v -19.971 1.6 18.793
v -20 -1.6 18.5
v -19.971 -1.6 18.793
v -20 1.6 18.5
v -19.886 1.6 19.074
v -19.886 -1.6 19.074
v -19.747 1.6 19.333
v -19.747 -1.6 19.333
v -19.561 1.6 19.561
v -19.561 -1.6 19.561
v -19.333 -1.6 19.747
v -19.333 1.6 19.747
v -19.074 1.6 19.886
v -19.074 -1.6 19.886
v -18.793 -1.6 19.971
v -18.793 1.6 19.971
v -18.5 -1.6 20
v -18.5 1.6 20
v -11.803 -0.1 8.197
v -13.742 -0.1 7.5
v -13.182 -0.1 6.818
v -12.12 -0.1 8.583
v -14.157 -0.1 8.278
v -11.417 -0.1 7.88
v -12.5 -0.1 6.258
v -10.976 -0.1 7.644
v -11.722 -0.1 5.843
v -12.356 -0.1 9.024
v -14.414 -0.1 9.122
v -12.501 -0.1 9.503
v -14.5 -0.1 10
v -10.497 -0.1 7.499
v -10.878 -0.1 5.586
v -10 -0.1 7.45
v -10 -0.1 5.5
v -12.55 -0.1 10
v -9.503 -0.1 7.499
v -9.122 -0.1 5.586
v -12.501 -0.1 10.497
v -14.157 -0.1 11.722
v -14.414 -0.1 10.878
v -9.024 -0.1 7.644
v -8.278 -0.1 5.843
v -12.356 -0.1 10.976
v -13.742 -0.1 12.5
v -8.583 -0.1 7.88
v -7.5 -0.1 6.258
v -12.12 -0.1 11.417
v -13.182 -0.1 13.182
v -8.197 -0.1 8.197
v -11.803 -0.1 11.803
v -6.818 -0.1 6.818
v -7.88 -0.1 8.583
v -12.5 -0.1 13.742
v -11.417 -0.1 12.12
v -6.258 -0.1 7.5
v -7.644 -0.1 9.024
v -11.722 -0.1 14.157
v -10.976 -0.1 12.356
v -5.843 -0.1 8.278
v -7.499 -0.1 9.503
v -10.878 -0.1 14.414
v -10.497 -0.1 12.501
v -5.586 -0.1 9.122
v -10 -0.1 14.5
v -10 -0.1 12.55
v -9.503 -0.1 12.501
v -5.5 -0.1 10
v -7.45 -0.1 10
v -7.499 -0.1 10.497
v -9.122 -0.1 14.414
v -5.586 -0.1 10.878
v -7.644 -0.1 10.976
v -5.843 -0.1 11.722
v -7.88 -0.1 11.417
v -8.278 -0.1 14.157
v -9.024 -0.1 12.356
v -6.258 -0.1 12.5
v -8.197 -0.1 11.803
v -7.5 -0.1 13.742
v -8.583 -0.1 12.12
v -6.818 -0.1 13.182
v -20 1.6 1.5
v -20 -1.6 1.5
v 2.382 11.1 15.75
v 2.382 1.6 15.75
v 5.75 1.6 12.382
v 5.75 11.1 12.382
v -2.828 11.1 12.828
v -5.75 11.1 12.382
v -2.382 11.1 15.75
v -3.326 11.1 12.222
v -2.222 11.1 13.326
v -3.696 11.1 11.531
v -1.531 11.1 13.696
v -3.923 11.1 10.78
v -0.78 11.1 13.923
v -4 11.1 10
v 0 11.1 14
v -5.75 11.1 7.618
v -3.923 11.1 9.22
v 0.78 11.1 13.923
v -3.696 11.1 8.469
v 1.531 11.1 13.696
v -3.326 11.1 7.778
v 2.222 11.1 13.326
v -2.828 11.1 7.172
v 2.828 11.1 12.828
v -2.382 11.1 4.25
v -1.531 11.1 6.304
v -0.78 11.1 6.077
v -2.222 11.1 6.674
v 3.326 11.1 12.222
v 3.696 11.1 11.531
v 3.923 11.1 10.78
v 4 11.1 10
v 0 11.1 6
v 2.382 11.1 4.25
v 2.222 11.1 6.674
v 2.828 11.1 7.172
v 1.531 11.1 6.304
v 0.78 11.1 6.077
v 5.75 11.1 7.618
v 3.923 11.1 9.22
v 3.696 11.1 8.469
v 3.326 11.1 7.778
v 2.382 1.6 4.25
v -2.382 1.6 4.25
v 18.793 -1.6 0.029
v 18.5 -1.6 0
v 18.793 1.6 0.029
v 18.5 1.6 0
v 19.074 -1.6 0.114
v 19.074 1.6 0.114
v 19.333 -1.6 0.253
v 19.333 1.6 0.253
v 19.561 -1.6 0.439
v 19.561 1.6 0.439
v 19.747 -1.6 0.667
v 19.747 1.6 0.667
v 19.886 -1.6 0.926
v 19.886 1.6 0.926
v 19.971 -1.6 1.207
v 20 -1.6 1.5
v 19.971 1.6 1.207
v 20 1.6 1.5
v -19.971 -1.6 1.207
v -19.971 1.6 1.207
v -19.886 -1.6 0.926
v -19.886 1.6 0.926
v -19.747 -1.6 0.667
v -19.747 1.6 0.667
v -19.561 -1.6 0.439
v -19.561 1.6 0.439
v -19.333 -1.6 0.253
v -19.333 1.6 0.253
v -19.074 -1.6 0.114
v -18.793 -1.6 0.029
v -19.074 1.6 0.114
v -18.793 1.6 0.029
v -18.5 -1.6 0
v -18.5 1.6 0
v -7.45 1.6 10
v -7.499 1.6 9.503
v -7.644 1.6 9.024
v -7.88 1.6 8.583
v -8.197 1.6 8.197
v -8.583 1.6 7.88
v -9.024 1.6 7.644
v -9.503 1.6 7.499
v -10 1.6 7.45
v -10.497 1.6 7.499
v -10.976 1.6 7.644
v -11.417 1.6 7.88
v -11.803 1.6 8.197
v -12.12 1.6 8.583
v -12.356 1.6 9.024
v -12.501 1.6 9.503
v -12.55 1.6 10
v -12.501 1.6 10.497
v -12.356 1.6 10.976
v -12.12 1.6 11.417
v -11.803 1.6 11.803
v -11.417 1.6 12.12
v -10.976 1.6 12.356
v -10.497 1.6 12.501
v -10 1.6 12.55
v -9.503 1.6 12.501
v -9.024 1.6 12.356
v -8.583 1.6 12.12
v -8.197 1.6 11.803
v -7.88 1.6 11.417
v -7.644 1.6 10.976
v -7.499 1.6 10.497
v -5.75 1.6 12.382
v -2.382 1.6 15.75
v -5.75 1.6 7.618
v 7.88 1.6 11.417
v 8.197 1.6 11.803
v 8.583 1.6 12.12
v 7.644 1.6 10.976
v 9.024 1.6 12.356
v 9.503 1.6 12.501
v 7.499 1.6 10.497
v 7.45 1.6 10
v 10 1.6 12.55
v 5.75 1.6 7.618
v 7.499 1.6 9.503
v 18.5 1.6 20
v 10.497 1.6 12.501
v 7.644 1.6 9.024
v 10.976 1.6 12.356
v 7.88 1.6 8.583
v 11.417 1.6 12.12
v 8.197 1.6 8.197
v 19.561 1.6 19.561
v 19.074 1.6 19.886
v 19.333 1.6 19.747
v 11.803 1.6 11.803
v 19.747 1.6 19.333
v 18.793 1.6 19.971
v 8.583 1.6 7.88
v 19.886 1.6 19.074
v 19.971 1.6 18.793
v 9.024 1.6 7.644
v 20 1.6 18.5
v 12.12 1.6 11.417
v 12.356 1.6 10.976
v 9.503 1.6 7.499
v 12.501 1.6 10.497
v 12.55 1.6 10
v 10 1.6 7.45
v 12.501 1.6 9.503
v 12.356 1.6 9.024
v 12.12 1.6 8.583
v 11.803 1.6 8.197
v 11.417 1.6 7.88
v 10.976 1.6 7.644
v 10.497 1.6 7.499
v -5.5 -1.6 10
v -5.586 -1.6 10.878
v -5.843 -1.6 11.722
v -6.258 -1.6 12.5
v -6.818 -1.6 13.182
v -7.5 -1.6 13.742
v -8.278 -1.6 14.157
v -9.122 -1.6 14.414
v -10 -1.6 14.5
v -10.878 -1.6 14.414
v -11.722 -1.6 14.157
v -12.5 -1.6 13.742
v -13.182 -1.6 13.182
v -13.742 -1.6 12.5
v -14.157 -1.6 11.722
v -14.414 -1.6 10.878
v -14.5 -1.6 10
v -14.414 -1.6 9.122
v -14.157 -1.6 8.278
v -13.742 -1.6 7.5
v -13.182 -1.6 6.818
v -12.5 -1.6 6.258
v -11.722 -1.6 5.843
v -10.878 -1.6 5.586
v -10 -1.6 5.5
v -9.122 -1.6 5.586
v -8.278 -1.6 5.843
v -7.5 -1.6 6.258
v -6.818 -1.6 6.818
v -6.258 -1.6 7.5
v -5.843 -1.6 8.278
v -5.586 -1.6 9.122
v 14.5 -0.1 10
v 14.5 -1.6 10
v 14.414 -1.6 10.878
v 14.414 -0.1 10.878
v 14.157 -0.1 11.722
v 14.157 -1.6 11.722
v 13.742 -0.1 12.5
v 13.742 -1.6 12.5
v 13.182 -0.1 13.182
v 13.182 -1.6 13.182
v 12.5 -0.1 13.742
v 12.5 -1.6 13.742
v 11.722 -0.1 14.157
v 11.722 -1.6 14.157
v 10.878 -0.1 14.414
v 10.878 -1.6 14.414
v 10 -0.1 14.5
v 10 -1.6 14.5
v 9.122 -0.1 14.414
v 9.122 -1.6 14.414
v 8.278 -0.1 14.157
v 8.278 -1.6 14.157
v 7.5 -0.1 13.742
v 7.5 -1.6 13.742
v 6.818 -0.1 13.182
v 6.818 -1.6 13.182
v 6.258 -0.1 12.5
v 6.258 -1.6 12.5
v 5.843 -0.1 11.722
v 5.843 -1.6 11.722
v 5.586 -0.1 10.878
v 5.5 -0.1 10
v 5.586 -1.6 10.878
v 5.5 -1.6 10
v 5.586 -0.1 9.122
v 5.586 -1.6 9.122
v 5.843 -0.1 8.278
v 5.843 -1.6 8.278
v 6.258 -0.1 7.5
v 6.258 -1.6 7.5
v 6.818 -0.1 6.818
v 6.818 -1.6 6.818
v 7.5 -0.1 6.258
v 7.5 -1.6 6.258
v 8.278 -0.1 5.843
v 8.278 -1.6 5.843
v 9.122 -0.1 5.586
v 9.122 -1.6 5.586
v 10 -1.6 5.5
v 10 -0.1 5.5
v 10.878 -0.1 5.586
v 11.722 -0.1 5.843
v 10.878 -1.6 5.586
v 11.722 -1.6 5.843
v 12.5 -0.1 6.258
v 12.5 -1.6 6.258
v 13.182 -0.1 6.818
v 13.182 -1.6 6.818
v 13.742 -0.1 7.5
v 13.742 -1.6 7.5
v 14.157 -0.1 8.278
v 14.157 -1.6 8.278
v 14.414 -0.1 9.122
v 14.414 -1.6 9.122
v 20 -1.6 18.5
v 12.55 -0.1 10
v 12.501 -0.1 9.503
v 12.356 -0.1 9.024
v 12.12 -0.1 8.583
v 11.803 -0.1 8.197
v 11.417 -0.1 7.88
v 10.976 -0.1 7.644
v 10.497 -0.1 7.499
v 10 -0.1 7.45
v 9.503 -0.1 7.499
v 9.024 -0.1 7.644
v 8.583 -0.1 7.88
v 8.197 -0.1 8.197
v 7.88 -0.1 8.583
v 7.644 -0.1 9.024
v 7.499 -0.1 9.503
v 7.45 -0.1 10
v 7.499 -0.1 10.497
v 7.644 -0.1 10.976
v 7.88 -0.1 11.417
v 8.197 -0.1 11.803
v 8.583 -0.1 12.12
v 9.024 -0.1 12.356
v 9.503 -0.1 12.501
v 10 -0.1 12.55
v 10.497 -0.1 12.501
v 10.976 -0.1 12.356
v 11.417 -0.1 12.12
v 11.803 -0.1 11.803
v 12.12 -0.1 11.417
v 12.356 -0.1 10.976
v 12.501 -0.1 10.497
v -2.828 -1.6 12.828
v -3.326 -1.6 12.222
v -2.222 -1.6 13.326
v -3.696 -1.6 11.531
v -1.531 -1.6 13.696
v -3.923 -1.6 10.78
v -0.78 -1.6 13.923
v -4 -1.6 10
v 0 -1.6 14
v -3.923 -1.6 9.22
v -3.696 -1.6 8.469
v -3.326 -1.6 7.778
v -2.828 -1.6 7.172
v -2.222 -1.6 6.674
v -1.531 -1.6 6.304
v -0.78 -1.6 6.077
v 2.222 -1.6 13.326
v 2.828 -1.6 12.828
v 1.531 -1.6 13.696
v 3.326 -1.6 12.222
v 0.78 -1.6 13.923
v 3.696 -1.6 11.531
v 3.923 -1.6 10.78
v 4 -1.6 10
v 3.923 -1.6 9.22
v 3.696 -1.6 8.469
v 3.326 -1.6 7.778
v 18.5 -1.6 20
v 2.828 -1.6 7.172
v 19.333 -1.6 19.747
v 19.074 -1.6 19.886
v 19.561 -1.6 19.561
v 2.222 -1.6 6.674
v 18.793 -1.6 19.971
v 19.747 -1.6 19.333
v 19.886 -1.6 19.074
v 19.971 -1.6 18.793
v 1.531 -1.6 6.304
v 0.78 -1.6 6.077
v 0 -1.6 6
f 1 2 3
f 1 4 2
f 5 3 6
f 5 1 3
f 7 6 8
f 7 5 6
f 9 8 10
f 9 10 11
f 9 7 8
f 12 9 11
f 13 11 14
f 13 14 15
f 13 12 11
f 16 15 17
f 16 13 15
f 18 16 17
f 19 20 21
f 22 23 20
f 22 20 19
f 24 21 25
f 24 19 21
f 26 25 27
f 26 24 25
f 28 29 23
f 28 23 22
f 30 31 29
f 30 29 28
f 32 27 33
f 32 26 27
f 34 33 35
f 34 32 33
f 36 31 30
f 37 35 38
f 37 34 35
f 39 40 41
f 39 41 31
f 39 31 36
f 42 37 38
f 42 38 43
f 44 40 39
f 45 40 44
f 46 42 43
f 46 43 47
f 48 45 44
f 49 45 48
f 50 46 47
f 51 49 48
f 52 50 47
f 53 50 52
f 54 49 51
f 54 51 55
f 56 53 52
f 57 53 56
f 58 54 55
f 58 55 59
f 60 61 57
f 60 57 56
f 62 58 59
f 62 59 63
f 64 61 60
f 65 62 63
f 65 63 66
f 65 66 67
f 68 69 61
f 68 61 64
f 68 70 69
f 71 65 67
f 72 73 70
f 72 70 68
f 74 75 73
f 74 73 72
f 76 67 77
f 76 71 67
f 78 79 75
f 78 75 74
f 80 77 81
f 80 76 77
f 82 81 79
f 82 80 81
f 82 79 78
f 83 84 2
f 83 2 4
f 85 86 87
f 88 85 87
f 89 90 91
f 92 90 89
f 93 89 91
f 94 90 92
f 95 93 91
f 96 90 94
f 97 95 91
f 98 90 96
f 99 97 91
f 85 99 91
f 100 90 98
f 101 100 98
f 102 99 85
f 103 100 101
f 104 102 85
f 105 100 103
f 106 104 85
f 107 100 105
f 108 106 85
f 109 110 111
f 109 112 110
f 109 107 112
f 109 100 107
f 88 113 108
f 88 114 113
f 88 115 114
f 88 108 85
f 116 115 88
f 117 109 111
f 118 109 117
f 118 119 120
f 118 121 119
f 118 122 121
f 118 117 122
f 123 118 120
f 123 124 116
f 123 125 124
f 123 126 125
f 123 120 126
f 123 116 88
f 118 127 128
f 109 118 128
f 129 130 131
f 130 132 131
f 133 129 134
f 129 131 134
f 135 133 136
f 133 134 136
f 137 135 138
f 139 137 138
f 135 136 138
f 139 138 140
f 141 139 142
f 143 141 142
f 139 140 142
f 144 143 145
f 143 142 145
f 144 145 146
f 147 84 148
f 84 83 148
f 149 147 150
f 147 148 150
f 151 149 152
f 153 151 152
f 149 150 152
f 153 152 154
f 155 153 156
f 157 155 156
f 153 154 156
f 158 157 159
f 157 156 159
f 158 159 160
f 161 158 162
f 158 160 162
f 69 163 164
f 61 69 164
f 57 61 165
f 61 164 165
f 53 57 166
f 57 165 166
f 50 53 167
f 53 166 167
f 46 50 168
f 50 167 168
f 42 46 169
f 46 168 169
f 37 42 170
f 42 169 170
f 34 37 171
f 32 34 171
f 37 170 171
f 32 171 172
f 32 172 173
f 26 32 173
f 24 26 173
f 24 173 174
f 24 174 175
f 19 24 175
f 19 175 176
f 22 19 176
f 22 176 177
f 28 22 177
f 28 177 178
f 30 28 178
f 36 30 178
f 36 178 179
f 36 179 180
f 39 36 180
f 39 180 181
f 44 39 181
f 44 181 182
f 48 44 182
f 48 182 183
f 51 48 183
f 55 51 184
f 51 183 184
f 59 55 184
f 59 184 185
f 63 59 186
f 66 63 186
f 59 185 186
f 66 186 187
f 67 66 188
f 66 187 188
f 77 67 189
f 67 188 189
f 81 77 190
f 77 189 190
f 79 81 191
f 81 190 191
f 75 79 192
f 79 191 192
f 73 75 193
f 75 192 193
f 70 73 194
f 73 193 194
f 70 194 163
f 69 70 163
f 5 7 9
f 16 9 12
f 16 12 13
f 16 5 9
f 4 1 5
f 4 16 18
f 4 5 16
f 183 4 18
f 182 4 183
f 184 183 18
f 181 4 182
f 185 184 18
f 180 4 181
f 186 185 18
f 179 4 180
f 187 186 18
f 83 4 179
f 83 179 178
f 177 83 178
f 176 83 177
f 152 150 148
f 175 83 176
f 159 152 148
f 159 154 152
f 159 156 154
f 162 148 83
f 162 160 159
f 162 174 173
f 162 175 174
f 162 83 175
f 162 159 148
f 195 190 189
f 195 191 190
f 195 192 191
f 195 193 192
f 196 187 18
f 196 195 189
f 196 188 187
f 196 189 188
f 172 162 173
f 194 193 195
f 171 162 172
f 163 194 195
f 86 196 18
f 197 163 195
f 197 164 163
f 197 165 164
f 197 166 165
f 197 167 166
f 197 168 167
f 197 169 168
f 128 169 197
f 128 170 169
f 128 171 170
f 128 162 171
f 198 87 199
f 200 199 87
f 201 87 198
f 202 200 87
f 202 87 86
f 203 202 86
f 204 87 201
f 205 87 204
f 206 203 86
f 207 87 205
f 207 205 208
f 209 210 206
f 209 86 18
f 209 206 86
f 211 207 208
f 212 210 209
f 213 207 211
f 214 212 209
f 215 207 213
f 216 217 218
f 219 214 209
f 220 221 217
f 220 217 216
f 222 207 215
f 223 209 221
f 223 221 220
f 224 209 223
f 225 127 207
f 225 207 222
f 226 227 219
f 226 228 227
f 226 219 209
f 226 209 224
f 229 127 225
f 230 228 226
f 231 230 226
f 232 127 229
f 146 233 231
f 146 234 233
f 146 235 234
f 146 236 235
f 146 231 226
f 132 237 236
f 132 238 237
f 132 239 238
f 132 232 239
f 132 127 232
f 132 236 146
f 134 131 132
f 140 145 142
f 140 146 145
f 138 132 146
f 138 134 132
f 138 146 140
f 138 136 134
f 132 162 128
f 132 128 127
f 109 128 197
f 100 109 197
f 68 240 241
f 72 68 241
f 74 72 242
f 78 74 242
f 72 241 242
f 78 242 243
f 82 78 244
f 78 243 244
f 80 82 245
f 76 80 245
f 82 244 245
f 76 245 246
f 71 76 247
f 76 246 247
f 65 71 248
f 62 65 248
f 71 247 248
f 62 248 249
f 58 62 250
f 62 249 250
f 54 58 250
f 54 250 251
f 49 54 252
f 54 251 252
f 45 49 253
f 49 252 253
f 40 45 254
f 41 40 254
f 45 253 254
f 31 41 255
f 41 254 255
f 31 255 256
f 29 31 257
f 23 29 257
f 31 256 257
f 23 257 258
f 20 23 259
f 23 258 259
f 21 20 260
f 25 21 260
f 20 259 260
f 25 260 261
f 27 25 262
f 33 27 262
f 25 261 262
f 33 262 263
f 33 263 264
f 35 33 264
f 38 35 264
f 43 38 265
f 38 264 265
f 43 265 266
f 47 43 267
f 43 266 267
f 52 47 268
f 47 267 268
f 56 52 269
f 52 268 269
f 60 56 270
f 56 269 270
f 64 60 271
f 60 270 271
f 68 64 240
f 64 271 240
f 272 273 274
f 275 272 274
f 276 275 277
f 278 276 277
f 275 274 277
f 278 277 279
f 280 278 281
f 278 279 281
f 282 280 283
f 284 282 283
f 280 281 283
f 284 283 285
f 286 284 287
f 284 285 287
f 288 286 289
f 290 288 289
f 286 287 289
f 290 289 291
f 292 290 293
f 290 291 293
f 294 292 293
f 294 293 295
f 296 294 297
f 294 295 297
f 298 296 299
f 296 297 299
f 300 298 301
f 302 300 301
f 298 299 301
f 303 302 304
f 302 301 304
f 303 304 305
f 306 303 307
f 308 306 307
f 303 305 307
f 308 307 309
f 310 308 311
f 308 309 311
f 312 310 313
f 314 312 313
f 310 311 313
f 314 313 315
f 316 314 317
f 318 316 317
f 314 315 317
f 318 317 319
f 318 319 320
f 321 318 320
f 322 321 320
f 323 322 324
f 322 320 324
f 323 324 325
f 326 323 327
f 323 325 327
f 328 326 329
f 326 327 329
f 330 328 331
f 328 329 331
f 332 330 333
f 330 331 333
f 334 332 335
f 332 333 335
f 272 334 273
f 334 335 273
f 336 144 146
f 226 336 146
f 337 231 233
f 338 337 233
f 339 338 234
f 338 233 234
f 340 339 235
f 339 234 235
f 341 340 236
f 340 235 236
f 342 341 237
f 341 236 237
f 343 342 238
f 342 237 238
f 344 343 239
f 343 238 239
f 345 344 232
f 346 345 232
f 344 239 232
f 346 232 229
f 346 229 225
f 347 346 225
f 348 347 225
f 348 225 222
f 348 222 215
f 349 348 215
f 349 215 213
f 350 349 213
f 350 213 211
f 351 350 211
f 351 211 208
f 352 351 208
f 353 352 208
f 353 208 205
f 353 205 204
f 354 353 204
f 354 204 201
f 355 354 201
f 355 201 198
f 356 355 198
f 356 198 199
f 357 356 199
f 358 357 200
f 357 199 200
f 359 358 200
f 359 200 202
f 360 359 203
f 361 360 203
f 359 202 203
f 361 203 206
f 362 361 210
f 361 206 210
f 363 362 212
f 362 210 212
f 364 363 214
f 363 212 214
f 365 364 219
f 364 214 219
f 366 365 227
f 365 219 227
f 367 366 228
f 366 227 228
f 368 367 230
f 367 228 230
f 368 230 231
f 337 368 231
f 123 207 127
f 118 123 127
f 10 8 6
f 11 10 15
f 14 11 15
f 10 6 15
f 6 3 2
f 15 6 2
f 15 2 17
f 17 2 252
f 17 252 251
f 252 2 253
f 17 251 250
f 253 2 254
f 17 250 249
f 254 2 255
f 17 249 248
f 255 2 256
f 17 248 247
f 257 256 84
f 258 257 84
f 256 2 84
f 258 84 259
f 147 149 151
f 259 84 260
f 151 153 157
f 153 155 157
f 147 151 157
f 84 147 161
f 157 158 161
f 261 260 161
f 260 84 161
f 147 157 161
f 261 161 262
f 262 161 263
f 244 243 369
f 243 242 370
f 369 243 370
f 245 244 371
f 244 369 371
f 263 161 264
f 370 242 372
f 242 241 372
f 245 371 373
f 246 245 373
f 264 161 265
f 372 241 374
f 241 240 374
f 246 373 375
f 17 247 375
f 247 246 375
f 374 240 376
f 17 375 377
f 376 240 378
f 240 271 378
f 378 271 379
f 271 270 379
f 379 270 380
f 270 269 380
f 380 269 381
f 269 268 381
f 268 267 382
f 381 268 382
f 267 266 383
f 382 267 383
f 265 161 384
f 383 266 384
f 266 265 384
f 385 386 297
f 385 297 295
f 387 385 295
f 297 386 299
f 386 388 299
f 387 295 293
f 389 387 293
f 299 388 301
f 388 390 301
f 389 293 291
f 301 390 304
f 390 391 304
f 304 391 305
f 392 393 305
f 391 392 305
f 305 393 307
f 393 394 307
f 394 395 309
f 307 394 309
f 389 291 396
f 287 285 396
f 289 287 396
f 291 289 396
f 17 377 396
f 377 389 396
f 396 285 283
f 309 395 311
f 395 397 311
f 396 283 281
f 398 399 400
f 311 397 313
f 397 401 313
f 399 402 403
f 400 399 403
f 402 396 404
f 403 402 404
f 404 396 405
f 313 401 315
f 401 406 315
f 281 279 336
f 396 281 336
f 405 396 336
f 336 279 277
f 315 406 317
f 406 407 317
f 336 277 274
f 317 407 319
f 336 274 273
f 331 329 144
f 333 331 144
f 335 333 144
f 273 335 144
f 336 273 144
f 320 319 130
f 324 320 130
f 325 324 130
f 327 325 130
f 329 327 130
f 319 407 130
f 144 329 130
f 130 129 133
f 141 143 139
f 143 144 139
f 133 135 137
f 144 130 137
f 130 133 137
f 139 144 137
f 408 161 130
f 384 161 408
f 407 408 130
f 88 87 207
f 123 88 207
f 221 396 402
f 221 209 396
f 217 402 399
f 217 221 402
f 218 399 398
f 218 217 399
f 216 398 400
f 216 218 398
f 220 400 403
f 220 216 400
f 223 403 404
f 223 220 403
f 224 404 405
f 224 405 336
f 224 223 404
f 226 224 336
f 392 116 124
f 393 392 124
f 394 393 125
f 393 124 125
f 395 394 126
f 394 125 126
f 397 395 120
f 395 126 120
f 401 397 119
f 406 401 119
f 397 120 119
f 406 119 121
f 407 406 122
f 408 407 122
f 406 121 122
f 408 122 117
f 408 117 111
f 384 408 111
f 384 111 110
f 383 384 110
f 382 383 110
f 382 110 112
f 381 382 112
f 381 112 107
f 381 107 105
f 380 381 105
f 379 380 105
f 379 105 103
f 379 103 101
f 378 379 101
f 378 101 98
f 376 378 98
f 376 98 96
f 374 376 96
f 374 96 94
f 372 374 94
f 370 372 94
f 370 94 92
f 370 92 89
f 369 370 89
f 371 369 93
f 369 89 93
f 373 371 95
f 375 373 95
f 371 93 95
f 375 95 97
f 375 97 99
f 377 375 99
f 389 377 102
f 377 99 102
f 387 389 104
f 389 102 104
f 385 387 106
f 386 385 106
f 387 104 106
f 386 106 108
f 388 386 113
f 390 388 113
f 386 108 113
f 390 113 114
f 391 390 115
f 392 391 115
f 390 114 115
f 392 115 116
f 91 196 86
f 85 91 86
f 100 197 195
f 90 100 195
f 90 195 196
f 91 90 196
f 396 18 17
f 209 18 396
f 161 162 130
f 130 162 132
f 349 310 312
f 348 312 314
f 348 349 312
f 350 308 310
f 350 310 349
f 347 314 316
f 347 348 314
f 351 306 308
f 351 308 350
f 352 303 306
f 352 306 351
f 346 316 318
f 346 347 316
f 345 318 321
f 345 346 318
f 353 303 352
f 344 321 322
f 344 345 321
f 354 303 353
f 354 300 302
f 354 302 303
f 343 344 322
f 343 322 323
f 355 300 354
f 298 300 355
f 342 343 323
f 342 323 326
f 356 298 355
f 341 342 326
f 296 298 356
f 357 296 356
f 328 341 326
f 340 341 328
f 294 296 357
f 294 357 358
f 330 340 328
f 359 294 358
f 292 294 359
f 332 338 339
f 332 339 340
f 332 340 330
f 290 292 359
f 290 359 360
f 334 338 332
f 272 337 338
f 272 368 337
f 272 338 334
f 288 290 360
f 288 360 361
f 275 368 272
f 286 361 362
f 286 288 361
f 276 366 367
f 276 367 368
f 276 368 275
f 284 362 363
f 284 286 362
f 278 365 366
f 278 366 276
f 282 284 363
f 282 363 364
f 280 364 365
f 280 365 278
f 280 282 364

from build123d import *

# Parameters (mm, degrees)
SKETCH1_W           = 40
SKETCH1_H           = 3.2
BOSS_EXTRUDE1_DEPTH = 20
SKETCH3_R           = 2.55
CUT_EXTRUDE2_DEPTH  = 4.2
SKETCH5_R           = 4.5
CUT_EXTRUDE4_DEPTH  = 1.5
BOSS_EXTRUDE2_DEPTH = 9.5
SKETCH7_R           = 4
CUT_EXTRUDE5_DEPTH  = 13.7
FILLET1_R           = 1.5


with BuildPart() as part:
    # Sketch1 → Boss-Extrude1 (new body)
    with BuildSketch(Plane.XY):
        Rectangle(SKETCH1_W, SKETCH1_H)
    extrude(amount=BOSS_EXTRUDE1_DEPTH)

    # Sketch3 → Cut-Extrude2 (cut, through all)
    with BuildSketch(Plane(origin=(0, 1.6, 0), x_dir=(1, 0, 0), z_dir=(0, 1, 0))):
        with Locations((-10, -10)):
            Circle(SKETCH3_R)
        with Locations((10, -10)):
            Circle(SKETCH3_R)
    extrude(amount=-CUT_EXTRUDE2_DEPTH, mode=Mode.SUBTRACT)

    # Sketch5 → Cut-Extrude4 (cut)
    with BuildSketch(Plane.XZ.offset(1.6)):
        with Locations((10, 10)):
            Circle(SKETCH5_R)
        with Locations((-10, 10)):
            Circle(SKETCH5_R)
    extrude(amount=-CUT_EXTRUDE4_DEPTH, mode=Mode.SUBTRACT)

    # Sketch6 → Boss-Extrude2 (add)
    with BuildSketch(Plane(origin=(0, 1.6, 0), x_dir=(1, 0, 0), z_dir=(0, 1, 0))):
        Polygon((-2.381727984, -4.25), (-5.75, -7.618272016), (-5.75, -12.381727984), (-2.381727984, -15.75), (2.381727984, -15.75), (5.75, -12.381727984), (5.75, -7.618272016), (2.381727984, -4.25), align=None)
    extrude(amount=BOSS_EXTRUDE2_DEPTH)

    # Sketch7 → Cut-Extrude5 (cut, through all)
    with BuildSketch(Plane(origin=(0, 11.1, 0), x_dir=(1, 0, 0), z_dir=(0, 1, 0))):
        with Locations((0, -10)):
            Circle(SKETCH7_R)
    extrude(amount=-CUT_EXTRUDE5_DEPTH, mode=Mode.SUBTRACT)

    # Fillet1
    fillet1_edges = [part.edges().sort_by_distance(p)[0] for p in [
        (20, 0, 20),
        (-20, 0, 20),
        (20, 0, 0),
        (-20, 0, 0),
    ]]
    fillet(fillet1_edges, radius=FILLET1_R)


solid = part.part
